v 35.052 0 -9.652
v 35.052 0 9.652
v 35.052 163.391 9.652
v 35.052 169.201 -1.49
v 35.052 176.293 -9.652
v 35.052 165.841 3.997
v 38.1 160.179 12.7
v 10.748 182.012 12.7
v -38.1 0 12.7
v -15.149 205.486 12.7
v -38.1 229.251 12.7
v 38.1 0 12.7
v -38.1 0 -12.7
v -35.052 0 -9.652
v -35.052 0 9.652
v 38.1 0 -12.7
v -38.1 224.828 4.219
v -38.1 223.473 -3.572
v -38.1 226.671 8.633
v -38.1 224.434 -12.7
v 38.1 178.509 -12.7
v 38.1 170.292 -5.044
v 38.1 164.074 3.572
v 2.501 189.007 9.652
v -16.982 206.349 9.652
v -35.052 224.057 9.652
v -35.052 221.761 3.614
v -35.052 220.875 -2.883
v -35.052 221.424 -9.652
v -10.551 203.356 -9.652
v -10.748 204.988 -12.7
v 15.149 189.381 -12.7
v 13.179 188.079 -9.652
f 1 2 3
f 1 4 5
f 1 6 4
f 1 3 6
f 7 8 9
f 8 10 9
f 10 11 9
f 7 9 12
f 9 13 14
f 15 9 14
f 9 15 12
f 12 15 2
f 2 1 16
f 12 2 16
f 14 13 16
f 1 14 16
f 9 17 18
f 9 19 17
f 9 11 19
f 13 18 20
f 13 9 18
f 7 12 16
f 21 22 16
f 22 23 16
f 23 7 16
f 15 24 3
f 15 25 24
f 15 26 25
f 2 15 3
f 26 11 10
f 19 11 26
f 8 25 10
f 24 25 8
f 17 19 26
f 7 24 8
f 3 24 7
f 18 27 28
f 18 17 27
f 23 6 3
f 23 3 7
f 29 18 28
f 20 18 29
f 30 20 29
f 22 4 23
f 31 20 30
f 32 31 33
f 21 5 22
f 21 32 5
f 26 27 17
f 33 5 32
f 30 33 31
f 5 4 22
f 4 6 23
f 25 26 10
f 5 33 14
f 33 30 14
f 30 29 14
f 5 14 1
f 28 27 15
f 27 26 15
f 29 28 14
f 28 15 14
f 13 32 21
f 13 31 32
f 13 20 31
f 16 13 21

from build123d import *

# Parameters (mm, degrees)
SKETCH1_W           = 76.2
SKETCH1_H           = 25.4
SKETCH1_W_2         = 70.104
SKETCH1_H_2         = 19.304
BOSS_EXTRUDE1_DEPTH = 241.091915
SKETCH3_W           = 76.2
SKETCH3_H           = 25.4
SKETCH3_W_2         = 70.104
SKETCH3_H_2         = 19.304
BOSS_EXTRUDE2_DEPTH = 3.048
CUT_EXTRUDE2_START  = 104.493944
SKETCH5_R           = 38.1
CUT_EXTRUDE2_DEPTH  = 115.162609


with BuildPart() as part:
    # Sketch1 → Boss-Extrude1 (new body)
    with BuildSketch(Plane(origin=(0, 0, 0), x_dir=(1, 0, 0), z_dir=(0, 1, 0))):
        Rectangle(SKETCH1_W, SKETCH1_H)
        Rectangle(SKETCH1_W_2, SKETCH1_H_2, mode=Mode.SUBTRACT)
    extrude(amount=BOSS_EXTRUDE1_DEPTH)

    # Sketch3 → Boss-Extrude2 (add)
    with BuildSketch(Plane(origin=(0, 241.09191526, 0), x_dir=(1, 0, 0), z_dir=(0, 1, 0))):
        Rectangle(SKETCH3_W, SKETCH3_H)
        Rectangle(SKETCH3_W_2, SKETCH3_H_2, mode=Mode.SUBTRACT)
    extrude(amount=BOSS_EXTRUDE2_DEPTH)

    # Sketch5 → Cut-Extrude2 (cut)
    with BuildSketch(Plane(origin=(-101.44355263, 327.150922863, -35.760832037), x_dir=(0.275534909, -0.073492792, -0.958477607), z_dir=(0.736418318, -0.624735905, 0.259601829)).offset(CUT_EXTRUDE2_START)):
        Circle(SKETCH5_R)
    extrude(amount=CUT_EXTRUDE2_DEPTH, mode=Mode.SUBTRACT)


solid = part.part
